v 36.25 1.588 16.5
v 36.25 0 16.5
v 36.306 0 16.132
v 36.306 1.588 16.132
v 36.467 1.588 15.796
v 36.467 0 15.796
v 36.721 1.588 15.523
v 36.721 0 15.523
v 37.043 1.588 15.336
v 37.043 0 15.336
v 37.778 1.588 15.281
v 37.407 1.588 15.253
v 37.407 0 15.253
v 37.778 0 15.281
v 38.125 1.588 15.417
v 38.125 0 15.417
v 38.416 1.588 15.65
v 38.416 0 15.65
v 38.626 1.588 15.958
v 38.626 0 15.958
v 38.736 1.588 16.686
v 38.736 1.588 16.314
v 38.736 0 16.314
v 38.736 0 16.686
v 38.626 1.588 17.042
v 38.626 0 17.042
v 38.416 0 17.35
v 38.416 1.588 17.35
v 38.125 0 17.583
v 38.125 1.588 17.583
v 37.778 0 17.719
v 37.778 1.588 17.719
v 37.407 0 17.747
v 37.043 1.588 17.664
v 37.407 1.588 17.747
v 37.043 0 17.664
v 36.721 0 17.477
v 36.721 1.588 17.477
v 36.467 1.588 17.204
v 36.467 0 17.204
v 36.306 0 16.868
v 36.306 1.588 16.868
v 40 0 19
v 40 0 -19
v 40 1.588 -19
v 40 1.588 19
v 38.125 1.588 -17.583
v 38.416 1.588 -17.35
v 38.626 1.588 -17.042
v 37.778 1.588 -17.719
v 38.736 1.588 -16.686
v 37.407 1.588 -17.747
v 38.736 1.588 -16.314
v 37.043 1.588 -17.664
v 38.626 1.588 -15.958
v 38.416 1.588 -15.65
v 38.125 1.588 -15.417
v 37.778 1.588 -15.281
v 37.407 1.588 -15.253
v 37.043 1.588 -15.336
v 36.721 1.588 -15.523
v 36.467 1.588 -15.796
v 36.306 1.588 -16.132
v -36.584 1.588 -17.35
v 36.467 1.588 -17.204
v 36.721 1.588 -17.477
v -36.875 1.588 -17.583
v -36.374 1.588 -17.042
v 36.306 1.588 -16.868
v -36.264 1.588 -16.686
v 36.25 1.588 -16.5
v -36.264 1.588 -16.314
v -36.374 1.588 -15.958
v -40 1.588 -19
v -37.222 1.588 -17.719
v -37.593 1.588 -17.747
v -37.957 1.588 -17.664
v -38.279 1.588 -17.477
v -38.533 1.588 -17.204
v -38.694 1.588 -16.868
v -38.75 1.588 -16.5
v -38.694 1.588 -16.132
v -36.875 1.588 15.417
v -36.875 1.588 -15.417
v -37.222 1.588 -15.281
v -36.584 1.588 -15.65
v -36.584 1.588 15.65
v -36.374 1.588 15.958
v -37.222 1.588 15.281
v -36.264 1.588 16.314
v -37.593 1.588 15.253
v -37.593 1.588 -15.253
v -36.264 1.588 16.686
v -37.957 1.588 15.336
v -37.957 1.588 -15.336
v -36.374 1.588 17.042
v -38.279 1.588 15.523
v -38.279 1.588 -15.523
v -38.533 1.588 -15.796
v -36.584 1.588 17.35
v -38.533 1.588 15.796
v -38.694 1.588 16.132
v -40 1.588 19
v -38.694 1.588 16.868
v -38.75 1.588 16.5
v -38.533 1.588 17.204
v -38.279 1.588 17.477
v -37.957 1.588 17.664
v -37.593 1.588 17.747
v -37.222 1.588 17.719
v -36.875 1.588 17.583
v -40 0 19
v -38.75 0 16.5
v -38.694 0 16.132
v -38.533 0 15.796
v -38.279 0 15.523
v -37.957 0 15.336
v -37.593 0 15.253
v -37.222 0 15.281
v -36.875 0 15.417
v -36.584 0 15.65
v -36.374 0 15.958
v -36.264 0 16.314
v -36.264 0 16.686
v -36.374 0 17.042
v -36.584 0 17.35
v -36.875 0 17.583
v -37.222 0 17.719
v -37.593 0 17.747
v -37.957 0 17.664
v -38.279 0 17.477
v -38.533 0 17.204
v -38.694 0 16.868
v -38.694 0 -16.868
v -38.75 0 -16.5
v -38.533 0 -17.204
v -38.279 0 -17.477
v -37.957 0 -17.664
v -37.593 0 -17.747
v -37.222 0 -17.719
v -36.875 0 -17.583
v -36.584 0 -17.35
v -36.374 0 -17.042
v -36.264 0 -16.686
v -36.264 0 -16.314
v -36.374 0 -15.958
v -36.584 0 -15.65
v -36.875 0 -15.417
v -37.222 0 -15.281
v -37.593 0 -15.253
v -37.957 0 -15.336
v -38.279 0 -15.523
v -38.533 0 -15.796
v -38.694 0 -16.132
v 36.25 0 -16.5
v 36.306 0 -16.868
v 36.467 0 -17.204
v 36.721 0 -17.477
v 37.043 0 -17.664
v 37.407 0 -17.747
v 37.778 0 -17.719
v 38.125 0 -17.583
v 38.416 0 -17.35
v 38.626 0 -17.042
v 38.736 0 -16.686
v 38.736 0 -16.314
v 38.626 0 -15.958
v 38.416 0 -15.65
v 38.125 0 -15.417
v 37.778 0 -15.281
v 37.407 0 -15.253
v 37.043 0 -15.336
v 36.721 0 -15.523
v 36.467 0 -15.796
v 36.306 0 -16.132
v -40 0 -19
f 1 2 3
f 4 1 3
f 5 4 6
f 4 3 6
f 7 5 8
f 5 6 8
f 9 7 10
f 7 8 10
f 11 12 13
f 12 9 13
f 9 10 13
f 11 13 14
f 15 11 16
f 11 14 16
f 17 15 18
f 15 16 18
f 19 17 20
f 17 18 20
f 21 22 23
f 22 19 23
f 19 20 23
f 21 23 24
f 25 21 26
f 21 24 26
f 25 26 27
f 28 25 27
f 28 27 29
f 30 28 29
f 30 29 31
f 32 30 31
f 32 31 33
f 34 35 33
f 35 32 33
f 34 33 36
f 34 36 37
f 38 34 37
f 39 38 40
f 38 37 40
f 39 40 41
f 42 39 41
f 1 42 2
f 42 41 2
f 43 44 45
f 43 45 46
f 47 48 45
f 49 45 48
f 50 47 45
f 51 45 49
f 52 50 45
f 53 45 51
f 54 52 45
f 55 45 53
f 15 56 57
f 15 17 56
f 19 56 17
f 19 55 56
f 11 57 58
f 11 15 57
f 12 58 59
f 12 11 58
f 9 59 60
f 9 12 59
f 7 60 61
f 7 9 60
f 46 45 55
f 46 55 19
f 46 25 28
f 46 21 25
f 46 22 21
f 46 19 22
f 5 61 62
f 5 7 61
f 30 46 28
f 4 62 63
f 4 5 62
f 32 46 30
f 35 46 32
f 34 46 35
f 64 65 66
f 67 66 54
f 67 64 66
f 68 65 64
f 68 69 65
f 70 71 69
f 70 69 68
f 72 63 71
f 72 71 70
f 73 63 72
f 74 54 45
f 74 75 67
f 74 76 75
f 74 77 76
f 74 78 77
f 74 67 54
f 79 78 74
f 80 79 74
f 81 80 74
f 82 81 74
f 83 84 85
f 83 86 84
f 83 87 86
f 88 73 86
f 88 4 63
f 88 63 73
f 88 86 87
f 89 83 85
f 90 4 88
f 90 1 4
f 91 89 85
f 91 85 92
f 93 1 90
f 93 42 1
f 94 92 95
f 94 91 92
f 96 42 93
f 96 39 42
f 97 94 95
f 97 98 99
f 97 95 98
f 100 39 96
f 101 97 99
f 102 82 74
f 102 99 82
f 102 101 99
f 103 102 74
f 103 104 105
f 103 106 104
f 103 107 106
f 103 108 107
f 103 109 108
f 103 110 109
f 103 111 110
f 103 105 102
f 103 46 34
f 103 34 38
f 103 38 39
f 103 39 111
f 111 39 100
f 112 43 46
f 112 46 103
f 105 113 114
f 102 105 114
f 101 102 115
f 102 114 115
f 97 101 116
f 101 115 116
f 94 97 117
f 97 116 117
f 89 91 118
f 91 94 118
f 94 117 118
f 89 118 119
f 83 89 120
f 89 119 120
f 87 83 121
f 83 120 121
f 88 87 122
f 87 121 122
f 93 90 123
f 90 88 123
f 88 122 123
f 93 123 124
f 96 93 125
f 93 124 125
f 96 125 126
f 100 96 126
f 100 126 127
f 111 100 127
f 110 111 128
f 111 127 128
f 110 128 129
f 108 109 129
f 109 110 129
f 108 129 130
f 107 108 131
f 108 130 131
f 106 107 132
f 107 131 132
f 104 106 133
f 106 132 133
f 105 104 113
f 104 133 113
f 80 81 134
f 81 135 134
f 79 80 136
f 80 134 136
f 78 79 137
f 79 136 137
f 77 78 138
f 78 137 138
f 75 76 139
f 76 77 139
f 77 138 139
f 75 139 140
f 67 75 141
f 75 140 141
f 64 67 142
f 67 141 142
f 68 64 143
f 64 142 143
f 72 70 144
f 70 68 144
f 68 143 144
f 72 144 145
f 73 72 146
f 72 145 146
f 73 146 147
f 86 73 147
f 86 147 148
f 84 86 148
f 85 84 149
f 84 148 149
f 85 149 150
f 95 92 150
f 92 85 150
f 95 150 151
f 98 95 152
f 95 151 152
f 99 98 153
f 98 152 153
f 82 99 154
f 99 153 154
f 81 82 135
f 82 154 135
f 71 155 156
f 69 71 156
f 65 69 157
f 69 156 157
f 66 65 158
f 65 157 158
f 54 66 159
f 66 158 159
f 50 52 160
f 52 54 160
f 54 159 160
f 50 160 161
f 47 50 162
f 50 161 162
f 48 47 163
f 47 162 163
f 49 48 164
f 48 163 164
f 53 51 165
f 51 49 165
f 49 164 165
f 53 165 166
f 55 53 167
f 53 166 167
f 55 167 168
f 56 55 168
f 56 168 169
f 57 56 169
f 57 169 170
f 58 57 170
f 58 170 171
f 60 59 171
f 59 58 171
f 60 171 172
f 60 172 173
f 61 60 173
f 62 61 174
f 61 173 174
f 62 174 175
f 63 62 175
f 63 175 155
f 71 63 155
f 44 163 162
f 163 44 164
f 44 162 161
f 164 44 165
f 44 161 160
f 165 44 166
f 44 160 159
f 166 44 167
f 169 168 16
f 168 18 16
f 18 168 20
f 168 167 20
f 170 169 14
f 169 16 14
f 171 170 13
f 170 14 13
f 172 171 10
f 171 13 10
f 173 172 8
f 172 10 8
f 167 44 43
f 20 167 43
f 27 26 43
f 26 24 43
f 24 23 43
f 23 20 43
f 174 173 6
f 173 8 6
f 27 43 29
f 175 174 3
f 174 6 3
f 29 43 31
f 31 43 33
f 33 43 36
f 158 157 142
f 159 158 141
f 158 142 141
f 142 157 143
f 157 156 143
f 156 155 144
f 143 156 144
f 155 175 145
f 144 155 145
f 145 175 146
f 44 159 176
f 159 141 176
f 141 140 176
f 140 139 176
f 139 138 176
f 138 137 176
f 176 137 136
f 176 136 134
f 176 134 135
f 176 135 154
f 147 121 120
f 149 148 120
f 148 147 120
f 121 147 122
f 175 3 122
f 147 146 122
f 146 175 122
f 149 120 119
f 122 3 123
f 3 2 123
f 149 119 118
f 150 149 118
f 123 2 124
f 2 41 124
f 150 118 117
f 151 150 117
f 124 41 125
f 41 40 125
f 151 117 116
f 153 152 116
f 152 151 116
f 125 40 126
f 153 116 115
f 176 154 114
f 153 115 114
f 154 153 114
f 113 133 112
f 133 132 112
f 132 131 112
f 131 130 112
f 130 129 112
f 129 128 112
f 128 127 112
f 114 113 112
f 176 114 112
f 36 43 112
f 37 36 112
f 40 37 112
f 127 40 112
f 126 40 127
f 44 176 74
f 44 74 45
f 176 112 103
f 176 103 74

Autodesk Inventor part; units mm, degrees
ref_plane "YZ Plane" through (0, 0, 0) normal (1, 0, 0) x (0, 1, 0)
ref_plane "XZ Plane" through (0, 0, 0) normal (0, 1, 0) x (-1, 0, 0)
ref_plane "XY Plane" through (0, 0, 0) normal (0, 0, 1) x (1, 0, 0)
sketch "Sketch1" plane through (0, 0, 0) normal (0, 1, 0) x (-1, 0, 0)
  line L0 (40, -19) -> (-40, -19)
  line L1 (-40, -19) -> (-40, 19)
  line L2 (-40, 19) -> (40, 19)
  line L3 (40, 19) -> (40, -19)
  line L4 (37.5, -16.5) -> (-37.5, -16.5) construction
  line L5 (-37.5, -16.5) -> (-37.5, 16.5) construction
  line L6 (-37.5, 16.5) -> (37.5, 16.5) construction
  line L7 (37.5, 16.5) -> (37.5, -16.5) construction
  circle A0 centre (37.5, -16.5) radius 1.25
  line L8 (0, -19) -> (0, 19) construction
  line L9 (-40, 0) -> (40, 0) construction
  circle A1 centre (-37.5, -16.5) radius 1.25
  circle A2 centre (37.5, 16.5) radius 1.25
  circle A3 centre (-37.5, 16.5) radius 1.25
  point P0 (0, 0)
  dimension "d0" = 80
  dimension "d1" = 38
  dimension "d2" = 40
  dimension "d3" = 19
  dimension "d4" = 75
  dimension "d5" = 33
  dimension "d6" = 2.5
  dimension "d7" = 2.5
  dimension "d8" = 2.5
extrude "Extrusion1" add sketch "Sketch1" along normal blind 1.5875
equation "\"d2\" = 0.5 * d0"
equation "\"d3\" = 0.5 * d1"
equation "\"d7\" = d6"
